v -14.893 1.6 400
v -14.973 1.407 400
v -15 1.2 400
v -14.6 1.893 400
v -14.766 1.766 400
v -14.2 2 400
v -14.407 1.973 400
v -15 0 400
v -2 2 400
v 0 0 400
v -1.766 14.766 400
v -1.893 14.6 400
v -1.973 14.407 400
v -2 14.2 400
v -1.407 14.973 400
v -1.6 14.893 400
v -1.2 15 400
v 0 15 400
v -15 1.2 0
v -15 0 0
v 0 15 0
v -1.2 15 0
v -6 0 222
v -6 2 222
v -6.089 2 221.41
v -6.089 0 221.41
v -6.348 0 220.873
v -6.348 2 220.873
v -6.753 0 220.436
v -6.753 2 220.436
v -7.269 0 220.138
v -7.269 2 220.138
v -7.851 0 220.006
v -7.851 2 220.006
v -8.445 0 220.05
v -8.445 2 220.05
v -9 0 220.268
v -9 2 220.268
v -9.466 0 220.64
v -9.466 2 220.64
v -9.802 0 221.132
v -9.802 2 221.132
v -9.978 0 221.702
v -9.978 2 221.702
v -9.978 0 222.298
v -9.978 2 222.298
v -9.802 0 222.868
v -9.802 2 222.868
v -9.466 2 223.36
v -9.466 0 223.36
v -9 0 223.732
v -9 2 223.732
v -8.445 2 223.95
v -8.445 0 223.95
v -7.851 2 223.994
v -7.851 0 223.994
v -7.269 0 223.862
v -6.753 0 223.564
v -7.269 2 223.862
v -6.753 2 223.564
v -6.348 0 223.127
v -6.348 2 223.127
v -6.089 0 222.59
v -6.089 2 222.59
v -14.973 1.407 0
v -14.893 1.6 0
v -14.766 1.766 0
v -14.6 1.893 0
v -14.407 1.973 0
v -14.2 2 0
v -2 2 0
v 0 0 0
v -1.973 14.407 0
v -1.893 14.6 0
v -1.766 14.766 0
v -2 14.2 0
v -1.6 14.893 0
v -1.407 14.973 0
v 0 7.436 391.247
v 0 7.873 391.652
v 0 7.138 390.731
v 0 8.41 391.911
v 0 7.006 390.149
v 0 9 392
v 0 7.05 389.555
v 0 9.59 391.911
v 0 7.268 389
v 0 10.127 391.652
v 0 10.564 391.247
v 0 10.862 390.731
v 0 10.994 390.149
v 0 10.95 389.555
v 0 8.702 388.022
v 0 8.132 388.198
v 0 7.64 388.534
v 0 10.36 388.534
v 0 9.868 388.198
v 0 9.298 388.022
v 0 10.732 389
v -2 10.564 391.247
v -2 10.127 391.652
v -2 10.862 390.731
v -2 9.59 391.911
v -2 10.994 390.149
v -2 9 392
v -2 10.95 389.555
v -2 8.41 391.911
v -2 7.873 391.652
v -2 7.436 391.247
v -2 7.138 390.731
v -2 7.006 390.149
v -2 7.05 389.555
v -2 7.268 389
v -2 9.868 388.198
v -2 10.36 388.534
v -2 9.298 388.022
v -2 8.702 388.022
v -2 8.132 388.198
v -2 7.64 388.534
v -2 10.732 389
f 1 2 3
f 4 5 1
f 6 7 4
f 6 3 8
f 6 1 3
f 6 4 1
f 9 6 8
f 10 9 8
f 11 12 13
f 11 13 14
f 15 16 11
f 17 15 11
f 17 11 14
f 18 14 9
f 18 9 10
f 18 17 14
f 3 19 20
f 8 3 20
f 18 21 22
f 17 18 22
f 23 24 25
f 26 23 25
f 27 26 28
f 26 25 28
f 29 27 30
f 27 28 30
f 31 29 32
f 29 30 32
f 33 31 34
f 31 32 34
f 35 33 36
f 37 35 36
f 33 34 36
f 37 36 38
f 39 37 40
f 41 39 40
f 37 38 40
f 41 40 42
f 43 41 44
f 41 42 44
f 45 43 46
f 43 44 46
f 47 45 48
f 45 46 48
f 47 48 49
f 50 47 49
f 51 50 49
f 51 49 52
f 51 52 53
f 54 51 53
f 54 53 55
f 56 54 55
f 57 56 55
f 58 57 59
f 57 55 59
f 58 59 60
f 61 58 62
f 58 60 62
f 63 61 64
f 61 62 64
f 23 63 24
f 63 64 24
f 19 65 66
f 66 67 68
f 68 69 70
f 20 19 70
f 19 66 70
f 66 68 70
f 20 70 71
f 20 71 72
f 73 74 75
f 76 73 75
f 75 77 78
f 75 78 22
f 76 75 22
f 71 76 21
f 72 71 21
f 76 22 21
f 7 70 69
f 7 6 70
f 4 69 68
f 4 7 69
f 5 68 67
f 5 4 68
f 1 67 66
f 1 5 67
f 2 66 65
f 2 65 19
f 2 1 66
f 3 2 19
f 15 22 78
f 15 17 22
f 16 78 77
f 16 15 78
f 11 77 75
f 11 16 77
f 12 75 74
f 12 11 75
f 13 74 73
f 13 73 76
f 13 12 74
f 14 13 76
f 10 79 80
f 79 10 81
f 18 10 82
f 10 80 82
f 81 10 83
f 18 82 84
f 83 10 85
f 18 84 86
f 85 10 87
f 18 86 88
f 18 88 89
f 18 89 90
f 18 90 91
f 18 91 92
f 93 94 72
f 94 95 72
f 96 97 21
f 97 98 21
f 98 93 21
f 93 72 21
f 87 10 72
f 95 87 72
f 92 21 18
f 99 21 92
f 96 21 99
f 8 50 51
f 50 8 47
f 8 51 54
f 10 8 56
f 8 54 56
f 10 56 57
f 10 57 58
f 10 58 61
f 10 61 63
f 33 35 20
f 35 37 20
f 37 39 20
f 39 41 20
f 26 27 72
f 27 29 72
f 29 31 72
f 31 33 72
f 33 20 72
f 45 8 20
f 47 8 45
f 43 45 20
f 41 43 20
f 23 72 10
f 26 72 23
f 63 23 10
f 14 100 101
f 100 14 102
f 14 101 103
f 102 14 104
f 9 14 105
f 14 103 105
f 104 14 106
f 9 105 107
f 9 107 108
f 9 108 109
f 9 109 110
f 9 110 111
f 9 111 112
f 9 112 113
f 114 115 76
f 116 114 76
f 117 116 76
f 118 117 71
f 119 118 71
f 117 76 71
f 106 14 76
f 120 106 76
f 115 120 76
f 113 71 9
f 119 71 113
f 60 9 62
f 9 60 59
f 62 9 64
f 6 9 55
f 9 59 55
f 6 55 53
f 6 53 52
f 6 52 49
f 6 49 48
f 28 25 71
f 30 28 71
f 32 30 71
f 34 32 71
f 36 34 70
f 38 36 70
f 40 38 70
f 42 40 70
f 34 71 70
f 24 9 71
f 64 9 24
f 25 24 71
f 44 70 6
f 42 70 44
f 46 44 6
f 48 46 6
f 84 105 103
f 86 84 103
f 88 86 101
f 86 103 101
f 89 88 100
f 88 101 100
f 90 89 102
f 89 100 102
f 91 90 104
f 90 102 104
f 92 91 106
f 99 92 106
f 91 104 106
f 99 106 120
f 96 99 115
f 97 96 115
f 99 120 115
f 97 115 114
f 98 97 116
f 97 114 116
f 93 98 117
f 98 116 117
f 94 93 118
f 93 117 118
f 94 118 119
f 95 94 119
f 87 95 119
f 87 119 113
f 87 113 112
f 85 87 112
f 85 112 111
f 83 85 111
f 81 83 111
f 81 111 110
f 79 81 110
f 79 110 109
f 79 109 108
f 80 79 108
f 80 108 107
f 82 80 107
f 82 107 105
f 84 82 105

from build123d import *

# Parameters (mm, degrees)
EXTRUDE_1_DEPTH     = 400
FILLET_1_R          = 0.8
SKETCH_2_R          = 2
CUT_EXTRUDE_1_DEPTH = 2
SKETCH_3_R          = 2
CUT_EXTRUDE_2_DEPTH = 400


with BuildPart() as part:
    # 草图1 → 凸台-拉伸1 (new body)
    with BuildSketch(Plane.XY):
        Polygon((0, 0), (0, 15), (-2, 15), (-2, 2), (-15, 2), (-15, 0), align=None)
    extrude(amount=EXTRUDE_1_DEPTH)

    # 圆角1
    fillet_1_edges = [part.edges().sort_by_distance(p)[0] for p in [
        (-15, 2, 200),
        (-2, 15, 200),
    ]]
    fillet(fillet_1_edges, radius=FILLET_1_R)

    # 草图2 → 切除-拉伸1 (cut)
    with BuildSketch(Plane(origin=(0, 2, 0), x_dir=(1, 0, 0), z_dir=(0, 1, 0))):
        with Locations((-8, -222)):
            Circle(SKETCH_2_R)
    extrude(amount=-CUT_EXTRUDE_1_DEPTH, mode=Mode.SUBTRACT)

    # 草图3 → 切除-拉伸2 (cut)
    with BuildSketch(Plane.ZY.offset(2)):
        with Locations((390, 9)):
            Circle(SKETCH_3_R)
    extrude(amount=-CUT_EXTRUDE_2_DEPTH, mode=Mode.SUBTRACT)


solid = part.part
